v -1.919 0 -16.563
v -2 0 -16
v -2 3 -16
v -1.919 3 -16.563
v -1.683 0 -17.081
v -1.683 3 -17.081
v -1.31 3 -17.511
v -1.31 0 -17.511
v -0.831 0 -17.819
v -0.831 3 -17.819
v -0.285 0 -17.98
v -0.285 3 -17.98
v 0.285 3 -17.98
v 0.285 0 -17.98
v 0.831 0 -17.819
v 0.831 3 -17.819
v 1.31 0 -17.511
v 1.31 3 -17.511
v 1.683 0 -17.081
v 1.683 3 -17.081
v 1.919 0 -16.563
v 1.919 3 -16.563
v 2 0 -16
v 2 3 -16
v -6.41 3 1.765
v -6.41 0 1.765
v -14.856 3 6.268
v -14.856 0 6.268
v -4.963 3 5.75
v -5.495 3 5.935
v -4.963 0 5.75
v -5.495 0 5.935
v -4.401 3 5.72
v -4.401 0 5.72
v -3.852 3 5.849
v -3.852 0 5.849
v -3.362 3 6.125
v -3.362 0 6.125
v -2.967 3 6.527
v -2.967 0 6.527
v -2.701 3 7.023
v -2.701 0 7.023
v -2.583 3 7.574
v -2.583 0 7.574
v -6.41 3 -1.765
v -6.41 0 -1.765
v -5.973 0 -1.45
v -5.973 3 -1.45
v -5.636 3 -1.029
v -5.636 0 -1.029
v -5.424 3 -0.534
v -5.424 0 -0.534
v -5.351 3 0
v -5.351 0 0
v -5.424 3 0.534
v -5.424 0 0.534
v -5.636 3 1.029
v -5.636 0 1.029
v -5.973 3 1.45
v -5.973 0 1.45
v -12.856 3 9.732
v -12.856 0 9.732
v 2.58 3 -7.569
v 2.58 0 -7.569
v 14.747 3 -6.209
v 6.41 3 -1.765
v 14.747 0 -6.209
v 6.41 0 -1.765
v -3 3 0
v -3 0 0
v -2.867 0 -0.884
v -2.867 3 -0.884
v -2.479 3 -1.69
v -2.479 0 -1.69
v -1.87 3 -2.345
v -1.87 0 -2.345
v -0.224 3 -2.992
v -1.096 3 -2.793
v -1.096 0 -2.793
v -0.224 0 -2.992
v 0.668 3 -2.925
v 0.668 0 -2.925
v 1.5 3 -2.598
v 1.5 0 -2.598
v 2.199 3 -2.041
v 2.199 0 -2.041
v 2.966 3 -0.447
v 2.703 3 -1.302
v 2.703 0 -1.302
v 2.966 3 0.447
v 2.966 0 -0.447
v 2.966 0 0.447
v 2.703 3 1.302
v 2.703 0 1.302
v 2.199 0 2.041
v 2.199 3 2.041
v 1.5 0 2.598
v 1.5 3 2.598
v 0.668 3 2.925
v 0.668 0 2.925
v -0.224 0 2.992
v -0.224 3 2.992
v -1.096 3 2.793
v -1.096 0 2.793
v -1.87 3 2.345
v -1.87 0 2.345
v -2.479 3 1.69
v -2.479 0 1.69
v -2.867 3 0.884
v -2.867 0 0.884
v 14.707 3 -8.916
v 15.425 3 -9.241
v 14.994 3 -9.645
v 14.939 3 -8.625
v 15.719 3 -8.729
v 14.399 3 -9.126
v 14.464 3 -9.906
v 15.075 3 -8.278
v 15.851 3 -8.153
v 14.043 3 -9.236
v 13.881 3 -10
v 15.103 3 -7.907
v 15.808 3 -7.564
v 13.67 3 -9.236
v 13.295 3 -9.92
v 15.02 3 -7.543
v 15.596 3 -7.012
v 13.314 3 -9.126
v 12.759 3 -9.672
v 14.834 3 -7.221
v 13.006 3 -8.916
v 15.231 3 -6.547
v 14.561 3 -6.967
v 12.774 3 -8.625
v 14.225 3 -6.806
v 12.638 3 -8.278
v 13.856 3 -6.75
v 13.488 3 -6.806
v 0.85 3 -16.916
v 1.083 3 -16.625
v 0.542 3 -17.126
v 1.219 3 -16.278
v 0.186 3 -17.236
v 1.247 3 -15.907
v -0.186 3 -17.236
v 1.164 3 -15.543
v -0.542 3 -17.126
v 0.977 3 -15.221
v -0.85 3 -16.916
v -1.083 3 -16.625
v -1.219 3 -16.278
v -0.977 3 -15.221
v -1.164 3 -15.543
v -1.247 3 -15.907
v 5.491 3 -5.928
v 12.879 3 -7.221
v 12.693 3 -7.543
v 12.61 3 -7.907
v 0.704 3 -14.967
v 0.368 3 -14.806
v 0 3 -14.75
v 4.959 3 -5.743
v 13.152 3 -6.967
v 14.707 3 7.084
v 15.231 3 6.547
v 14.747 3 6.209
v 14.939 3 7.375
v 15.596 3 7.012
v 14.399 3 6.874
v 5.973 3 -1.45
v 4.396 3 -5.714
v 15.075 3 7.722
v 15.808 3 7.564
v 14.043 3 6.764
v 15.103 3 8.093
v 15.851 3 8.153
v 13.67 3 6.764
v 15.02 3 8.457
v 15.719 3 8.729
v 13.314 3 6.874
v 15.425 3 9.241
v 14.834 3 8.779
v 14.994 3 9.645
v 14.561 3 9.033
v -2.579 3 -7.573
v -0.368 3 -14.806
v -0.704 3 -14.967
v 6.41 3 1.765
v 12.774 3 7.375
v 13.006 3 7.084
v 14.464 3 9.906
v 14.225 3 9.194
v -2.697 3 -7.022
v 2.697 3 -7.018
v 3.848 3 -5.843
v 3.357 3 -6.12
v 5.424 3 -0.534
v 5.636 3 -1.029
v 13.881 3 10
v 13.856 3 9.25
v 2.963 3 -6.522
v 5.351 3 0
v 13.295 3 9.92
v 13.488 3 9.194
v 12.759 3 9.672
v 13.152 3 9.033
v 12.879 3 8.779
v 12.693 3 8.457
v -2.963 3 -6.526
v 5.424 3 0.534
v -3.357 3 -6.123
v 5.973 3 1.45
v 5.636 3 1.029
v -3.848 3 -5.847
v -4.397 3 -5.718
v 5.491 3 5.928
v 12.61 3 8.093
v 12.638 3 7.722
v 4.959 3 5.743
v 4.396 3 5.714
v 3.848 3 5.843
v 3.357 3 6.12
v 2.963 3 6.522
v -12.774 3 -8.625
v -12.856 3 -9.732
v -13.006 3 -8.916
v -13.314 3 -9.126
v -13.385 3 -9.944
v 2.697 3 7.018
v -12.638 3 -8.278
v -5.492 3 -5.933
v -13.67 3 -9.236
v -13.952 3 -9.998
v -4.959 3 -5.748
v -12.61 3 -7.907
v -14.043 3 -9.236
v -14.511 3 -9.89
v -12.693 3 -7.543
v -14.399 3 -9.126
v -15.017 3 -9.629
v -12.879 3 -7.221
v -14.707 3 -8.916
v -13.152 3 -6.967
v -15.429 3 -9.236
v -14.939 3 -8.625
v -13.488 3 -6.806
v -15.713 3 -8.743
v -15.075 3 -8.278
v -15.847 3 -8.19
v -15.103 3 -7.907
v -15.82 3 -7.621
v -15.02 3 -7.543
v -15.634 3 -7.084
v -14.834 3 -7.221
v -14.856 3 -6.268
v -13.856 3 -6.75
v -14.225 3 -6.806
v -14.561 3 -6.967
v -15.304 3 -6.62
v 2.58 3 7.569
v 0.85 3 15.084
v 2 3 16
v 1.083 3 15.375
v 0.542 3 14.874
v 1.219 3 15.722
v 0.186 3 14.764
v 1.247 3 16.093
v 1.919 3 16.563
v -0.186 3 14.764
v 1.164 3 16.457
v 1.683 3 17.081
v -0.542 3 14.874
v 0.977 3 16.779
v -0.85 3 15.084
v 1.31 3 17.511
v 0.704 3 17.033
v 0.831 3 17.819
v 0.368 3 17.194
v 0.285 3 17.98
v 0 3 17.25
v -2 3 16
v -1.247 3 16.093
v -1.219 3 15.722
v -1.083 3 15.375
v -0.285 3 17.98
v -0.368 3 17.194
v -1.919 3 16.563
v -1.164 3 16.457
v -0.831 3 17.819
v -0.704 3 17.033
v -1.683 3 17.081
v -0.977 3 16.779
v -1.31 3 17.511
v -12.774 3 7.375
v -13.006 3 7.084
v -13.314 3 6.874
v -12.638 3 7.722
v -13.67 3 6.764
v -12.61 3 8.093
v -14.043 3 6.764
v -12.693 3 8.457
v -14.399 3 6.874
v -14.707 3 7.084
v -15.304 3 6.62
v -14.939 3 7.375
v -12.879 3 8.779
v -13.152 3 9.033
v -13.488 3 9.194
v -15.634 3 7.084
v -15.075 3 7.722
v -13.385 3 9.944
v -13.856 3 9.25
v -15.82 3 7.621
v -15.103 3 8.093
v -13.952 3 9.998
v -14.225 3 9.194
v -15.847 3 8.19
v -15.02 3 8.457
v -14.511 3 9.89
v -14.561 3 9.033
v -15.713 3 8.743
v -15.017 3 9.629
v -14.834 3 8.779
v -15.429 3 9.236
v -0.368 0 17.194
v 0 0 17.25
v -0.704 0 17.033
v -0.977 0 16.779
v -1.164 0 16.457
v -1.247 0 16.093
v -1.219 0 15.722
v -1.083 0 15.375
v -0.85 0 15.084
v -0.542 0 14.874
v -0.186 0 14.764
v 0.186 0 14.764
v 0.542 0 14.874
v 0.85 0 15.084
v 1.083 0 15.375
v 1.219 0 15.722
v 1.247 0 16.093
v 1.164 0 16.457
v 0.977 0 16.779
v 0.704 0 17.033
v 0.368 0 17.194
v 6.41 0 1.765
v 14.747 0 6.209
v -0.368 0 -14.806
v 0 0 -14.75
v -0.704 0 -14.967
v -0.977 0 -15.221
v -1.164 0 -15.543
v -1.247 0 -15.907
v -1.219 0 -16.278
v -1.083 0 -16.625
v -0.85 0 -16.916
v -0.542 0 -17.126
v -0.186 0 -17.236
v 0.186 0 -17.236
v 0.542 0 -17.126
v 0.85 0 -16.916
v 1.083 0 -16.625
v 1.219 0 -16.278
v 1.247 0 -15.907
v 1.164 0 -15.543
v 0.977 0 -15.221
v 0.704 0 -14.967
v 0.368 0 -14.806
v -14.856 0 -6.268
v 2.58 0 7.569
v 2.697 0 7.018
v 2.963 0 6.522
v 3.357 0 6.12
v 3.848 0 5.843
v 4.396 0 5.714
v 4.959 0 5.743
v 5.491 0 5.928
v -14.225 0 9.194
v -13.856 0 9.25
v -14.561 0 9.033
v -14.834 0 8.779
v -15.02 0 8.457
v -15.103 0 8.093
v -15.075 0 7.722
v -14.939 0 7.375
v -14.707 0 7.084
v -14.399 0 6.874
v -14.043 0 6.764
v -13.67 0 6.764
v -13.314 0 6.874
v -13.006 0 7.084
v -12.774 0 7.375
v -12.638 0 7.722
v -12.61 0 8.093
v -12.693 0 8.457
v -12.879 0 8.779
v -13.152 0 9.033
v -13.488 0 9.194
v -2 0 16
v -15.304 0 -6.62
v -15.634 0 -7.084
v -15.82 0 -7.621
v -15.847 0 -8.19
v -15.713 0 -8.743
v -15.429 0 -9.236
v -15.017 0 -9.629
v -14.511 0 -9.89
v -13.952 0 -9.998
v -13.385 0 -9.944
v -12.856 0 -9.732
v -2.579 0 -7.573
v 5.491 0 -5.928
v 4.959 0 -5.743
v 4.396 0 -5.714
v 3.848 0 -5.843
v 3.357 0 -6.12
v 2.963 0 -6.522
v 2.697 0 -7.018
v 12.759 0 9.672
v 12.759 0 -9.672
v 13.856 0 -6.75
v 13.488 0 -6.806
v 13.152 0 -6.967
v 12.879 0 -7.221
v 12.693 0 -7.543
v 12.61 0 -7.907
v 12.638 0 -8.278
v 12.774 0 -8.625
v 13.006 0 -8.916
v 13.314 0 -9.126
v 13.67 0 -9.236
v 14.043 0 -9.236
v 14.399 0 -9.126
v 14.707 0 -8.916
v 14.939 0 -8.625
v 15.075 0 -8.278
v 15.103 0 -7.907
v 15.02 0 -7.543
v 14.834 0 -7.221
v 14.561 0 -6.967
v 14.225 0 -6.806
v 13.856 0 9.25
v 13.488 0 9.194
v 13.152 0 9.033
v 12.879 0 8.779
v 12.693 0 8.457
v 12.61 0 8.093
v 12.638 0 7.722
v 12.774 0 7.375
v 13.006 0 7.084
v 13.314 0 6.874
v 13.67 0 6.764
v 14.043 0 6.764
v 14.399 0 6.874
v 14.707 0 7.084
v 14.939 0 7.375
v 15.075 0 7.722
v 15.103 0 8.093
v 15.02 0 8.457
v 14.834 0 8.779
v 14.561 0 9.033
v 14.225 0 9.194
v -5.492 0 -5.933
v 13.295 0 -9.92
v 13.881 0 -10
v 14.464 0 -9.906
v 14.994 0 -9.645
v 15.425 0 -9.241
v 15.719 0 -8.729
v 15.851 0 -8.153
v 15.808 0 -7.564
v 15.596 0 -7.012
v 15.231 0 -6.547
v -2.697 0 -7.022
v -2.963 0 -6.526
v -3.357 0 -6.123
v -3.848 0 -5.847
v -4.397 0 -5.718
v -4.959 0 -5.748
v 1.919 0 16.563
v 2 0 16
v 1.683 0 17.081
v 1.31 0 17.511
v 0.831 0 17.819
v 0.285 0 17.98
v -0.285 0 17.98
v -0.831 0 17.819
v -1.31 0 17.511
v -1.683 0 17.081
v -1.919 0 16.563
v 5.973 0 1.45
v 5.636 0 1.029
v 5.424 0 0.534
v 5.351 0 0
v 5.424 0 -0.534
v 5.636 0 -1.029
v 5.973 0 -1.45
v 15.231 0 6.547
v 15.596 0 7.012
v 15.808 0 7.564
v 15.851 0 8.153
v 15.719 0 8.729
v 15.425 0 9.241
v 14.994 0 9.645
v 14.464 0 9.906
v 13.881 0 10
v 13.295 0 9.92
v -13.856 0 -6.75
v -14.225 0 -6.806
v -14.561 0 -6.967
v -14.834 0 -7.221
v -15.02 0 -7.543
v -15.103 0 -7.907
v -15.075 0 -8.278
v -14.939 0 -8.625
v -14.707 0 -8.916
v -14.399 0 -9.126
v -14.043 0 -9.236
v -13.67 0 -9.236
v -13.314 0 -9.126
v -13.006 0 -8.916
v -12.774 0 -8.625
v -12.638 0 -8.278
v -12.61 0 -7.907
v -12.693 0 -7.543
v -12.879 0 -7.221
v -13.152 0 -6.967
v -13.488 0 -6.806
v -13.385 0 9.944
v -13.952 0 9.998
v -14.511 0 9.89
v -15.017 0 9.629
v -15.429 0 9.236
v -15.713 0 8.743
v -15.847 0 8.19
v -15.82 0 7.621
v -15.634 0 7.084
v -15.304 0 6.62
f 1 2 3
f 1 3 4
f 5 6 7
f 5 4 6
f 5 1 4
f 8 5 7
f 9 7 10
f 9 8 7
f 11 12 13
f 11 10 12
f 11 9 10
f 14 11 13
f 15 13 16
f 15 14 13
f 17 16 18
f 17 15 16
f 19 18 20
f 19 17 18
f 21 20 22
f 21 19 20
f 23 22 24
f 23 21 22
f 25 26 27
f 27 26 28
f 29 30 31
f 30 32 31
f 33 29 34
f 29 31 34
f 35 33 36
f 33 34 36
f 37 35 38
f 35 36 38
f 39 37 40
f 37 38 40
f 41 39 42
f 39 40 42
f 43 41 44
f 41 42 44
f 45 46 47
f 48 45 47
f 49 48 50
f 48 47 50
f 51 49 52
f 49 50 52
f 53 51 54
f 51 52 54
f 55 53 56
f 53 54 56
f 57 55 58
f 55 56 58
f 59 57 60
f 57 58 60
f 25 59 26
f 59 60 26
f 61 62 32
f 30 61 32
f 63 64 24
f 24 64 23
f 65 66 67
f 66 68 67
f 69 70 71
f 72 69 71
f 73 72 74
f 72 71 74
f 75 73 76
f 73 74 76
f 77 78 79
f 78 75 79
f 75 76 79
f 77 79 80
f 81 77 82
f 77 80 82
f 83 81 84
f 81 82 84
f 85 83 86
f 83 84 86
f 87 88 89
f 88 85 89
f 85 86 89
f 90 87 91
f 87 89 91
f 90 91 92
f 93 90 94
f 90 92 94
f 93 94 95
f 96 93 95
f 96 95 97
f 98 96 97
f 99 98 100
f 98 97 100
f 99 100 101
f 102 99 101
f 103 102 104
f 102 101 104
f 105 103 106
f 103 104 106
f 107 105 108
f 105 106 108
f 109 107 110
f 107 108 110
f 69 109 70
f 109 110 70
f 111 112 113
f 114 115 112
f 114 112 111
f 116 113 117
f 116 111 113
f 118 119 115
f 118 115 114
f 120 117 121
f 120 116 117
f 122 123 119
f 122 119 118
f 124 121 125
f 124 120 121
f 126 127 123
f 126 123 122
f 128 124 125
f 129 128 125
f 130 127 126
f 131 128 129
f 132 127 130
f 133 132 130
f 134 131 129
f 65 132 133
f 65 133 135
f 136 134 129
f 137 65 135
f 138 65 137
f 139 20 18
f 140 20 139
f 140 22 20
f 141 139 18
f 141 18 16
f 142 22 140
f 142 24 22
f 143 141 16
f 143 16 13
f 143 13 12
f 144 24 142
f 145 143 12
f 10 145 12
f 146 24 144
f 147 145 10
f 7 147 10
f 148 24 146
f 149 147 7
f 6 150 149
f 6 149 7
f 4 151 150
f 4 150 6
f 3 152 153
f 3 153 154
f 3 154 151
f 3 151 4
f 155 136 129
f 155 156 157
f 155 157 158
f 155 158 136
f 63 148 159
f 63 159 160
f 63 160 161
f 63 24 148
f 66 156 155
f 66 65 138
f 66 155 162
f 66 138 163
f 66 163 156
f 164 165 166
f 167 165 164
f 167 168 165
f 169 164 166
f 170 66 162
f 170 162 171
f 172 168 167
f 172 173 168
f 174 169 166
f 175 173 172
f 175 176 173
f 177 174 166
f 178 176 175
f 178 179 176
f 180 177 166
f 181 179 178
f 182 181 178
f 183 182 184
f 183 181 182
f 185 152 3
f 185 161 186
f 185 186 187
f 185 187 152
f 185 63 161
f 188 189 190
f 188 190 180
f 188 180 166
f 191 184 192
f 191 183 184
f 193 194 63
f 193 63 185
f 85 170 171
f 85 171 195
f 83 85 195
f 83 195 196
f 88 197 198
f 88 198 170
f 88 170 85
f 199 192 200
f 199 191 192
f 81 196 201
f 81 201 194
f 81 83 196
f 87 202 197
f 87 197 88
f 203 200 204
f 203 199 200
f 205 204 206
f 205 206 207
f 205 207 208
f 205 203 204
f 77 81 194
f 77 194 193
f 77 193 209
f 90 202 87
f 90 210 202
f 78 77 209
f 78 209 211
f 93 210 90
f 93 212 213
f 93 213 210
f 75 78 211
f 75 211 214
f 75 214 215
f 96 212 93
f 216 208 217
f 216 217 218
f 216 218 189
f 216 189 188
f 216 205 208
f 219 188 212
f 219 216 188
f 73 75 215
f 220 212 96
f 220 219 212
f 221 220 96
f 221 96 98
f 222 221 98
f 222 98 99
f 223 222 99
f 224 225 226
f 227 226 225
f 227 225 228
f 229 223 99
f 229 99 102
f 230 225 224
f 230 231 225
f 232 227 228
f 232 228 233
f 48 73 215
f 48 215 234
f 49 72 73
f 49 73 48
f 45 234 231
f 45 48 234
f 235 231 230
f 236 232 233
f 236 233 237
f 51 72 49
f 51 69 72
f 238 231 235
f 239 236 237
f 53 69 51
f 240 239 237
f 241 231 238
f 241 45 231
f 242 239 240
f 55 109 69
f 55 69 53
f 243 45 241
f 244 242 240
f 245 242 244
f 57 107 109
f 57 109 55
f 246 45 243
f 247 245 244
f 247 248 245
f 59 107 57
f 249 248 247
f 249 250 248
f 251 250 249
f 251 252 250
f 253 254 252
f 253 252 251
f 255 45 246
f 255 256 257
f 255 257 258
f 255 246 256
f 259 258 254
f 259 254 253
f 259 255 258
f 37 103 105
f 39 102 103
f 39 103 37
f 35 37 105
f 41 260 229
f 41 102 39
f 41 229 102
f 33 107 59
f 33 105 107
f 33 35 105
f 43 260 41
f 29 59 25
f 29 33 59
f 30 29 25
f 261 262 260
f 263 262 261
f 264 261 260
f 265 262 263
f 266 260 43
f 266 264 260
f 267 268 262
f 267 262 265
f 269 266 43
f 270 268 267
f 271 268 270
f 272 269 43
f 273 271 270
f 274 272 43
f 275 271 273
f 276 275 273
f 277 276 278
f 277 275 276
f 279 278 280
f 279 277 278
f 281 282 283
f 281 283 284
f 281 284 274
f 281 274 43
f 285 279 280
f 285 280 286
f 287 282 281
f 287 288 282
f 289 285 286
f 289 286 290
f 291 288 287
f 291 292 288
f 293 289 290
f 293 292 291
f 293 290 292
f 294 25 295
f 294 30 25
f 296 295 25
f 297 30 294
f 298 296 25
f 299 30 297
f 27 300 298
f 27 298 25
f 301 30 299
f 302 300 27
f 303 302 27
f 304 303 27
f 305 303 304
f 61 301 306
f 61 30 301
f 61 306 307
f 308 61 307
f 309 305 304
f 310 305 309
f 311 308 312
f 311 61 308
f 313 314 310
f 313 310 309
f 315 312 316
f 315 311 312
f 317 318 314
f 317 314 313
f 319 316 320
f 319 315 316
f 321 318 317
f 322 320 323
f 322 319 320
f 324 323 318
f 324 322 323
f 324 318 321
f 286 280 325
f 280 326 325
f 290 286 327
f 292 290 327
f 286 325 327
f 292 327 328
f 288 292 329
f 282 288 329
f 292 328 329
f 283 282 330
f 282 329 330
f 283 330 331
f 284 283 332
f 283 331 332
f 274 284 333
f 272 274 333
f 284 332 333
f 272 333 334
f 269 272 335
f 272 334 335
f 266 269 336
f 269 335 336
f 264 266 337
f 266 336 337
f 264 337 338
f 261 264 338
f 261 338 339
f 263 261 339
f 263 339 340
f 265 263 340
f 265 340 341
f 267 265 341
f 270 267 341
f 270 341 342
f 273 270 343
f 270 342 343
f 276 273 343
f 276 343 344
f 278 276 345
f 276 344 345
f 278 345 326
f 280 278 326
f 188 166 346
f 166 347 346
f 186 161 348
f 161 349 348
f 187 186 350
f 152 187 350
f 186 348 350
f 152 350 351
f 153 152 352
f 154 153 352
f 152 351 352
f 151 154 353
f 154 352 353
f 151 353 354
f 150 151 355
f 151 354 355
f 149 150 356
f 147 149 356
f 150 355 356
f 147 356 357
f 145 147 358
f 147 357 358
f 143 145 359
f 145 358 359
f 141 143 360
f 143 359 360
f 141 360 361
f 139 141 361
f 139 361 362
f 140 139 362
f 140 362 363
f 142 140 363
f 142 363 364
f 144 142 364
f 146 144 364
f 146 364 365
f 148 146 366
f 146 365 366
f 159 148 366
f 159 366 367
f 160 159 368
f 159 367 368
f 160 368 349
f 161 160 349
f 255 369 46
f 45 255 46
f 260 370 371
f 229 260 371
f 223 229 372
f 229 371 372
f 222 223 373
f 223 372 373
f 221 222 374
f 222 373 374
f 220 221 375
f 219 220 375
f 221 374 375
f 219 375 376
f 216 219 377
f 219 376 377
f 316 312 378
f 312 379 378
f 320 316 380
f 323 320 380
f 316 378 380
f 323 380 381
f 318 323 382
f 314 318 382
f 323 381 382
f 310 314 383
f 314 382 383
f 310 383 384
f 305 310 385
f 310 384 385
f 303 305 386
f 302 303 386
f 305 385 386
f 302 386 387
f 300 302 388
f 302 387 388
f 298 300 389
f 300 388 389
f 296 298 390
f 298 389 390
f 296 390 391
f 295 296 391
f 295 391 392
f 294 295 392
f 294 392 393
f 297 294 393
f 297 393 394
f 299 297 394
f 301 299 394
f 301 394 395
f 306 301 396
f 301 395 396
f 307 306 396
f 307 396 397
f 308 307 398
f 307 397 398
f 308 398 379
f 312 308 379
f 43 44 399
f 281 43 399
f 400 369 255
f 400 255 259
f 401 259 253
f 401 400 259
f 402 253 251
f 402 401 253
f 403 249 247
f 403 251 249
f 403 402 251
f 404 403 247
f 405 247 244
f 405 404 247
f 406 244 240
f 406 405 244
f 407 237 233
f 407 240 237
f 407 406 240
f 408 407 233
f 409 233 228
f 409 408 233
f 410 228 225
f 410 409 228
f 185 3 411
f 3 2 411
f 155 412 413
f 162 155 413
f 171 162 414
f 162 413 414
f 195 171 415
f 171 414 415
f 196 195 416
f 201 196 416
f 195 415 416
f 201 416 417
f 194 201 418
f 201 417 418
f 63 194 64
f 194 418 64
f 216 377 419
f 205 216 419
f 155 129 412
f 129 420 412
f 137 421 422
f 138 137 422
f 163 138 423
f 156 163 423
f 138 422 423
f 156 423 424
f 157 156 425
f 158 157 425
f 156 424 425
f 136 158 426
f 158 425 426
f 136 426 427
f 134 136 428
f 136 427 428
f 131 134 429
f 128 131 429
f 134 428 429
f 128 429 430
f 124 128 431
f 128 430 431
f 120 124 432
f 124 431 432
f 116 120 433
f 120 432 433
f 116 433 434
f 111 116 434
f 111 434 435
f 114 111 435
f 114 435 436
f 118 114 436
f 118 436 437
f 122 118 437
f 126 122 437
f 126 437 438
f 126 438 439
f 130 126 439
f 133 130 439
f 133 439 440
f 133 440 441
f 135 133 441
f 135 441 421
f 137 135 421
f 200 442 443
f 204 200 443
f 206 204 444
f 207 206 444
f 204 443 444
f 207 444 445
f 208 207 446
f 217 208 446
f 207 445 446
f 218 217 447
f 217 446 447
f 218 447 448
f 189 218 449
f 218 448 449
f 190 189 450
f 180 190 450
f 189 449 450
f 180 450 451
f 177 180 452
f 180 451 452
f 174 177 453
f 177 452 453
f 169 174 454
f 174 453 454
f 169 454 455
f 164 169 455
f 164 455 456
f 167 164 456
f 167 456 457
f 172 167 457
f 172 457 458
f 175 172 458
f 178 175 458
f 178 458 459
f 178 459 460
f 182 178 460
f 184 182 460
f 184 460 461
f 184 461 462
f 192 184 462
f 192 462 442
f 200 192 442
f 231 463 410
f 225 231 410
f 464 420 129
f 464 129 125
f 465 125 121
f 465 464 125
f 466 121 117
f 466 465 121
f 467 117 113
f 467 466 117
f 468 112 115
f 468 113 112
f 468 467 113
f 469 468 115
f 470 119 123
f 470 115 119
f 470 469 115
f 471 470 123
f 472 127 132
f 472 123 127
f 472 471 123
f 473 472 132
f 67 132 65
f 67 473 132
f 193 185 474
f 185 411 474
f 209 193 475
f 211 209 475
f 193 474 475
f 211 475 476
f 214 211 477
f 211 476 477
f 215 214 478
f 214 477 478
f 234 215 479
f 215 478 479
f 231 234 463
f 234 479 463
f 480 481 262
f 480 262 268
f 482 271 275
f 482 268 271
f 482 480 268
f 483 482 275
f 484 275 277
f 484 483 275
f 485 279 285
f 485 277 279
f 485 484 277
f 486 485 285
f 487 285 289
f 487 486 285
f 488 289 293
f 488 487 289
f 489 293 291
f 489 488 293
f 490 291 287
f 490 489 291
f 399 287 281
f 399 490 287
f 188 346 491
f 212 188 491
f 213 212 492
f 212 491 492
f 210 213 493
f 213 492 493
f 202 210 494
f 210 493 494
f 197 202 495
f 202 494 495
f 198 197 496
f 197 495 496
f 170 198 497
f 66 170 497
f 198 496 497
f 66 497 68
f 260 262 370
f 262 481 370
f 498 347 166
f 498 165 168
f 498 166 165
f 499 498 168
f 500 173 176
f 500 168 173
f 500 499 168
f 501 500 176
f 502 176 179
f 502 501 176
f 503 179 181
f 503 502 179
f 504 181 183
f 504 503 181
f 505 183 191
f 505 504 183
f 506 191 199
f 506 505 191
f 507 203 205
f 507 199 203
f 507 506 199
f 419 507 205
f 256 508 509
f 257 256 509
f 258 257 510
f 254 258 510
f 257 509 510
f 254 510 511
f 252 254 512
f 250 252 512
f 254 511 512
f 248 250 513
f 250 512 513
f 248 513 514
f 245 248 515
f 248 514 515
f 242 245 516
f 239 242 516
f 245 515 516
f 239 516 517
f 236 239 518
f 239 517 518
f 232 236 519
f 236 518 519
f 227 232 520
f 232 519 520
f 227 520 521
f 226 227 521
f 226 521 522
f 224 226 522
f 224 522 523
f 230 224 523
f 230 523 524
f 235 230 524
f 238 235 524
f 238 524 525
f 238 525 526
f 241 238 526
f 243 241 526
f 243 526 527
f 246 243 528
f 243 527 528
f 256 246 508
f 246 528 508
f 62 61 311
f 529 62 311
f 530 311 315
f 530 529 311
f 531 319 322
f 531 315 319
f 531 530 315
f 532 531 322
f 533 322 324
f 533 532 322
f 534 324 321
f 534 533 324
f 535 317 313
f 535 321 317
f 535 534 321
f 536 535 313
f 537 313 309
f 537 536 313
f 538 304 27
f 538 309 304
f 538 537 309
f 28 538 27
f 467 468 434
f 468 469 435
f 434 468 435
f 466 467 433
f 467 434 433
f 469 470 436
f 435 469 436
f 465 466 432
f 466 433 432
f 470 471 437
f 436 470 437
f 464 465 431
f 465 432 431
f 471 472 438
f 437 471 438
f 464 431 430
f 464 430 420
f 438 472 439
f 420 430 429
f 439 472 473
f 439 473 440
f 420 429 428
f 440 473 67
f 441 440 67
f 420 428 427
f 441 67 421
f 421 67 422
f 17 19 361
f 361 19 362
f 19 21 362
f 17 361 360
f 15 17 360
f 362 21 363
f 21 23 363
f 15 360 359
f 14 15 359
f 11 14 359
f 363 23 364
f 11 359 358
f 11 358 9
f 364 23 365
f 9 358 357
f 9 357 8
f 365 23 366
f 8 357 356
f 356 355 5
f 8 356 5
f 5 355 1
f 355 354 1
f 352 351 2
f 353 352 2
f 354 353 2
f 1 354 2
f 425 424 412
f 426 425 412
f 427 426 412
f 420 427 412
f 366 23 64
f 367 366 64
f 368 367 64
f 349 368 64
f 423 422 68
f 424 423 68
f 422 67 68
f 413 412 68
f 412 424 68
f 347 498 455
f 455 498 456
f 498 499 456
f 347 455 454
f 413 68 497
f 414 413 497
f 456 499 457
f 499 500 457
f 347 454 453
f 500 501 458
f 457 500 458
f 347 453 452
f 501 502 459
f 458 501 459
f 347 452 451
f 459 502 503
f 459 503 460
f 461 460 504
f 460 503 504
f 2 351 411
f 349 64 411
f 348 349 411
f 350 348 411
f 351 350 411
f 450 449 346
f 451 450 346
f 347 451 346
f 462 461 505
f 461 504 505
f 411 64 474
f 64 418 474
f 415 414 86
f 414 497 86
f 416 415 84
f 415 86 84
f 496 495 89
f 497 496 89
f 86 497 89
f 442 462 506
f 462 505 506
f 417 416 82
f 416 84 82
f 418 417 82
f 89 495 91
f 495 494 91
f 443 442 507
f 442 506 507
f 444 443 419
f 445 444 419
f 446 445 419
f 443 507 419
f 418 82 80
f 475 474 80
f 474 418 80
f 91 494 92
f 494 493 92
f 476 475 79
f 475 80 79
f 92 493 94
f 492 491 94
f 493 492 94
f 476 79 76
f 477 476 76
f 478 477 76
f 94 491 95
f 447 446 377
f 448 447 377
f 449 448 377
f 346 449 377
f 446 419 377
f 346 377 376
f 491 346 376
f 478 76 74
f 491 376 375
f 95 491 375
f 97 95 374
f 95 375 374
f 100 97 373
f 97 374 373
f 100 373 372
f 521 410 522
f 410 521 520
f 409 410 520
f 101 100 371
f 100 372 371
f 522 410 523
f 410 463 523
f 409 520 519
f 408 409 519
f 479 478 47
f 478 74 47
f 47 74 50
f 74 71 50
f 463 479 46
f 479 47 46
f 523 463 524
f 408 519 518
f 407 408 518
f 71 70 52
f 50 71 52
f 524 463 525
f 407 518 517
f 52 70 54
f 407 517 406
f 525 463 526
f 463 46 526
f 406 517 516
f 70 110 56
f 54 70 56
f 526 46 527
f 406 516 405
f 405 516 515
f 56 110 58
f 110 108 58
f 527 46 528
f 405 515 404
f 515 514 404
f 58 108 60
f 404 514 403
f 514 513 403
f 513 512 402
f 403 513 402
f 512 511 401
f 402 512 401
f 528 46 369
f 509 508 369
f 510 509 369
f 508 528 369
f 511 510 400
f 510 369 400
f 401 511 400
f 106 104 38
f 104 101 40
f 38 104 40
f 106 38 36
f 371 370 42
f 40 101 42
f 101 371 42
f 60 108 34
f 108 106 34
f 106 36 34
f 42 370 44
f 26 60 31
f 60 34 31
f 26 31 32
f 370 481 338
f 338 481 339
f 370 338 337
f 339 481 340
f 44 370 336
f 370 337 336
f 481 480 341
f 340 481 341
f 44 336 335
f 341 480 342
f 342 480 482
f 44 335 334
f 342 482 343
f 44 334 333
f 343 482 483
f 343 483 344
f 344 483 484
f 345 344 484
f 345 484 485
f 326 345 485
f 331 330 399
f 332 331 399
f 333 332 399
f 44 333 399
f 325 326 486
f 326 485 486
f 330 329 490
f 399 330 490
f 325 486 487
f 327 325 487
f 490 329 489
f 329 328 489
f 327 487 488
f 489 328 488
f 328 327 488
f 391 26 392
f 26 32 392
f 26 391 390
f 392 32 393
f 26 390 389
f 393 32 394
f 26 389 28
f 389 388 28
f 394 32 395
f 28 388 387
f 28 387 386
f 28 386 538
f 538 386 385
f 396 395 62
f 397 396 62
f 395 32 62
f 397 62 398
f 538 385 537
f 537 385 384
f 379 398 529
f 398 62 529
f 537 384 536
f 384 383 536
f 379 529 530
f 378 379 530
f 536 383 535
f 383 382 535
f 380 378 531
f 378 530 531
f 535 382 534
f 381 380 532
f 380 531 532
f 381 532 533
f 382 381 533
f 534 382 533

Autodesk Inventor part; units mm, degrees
ref_plane "YZ Plane" through (0, 0, 0) normal (1, 0, 0) x (0, 1, 0)
ref_plane "XZ Plane" through (0, 0, 0) normal (0, 1, 0) x (-1, 0, 0)
ref_plane "XY Plane" through (0, 0, 0) normal (0, 0, 1) x (1, 0, 0)
sketch "Boceto1" plane through (0, 0, 0) normal (0, 1, 0) x (-1, 0, 0)
  circle A0 centre (0, -16) radius 2
  circle A1 centre (13.856406, -8) radius 2
  circle A2 centre (13.856406, 8) radius 2
  circle A3 centre (0, 16) radius 2
  circle A4 centre (-13.856406, 8) radius 2
  circle A5 centre (-13.856406, -8) radius 2
  line L0 (-12.759095, -9.672097) -> (-5.490746, -5.928235)
  line L1 (-6.410449, -1.764863) -> (-14.746933, -6.209201)
  line L2 (-6.410449, 1.764863) -> (-14.746933, 6.209201)
  line L3 (-12.759095, 9.672097) -> (-5.490746, 5.928235)
  line L4 (2, 16) -> (2.583184, 7.574131)
  line L5 (-2, 16) -> (-2.579628, 7.569051)
  line L6 (2.579349, -7.573106) -> (2, -16)
  line L7 (-2.579628, -7.569051) -> (-2, -16)
  line L8 (12.856406, 9.732051) -> (5.495313, 5.934789)
  line L9 (14.856406, 6.267949) -> (6.4102, 1.764839)
  line L10 (14.856406, -6.267949) -> (6.4102, -1.764839)
  line L11 (12.856406, -9.732051) -> (5.491541, -5.932843)
  circle A6 centre (0, 0) radius 3
  arc A7 (-6.410449, -1.764863) -> (-6.410449, 1.764863) centre (-7.351331, 0) ccw
  arc A8 (-2.579628, -7.569051) -> (-5.490746, -5.928235) centre (-4.574918, -7.706228) ccw
  arc A9 (5.491541, -5.932843) -> (2.579349, -7.573106) centre (4.574639, -7.710282) ccw
  arc A10 (6.4102, 1.764839) -> (6.4102, -1.764839) centre (7.351127, 0) ccw
  arc A11 (2.583184, 7.574131) -> (5.495313, 5.934789) centre (4.578411, 7.712228) ccw
  arc A12 (-5.490746, 5.928235) -> (-2.579628, 7.569051) centre (-4.574918, 7.706228) ccw
  point P0 (0, -3.1)
  point P1 (-3.1, 0)
  point P2 (0, 3.1)
  point P3 (3.1, 0)
  dimension "d17" = 360
  dimension "d19" = 6
  dimension "d20" = 2
sketch "Boceto1 outline for Extrusión1" plane through (0, 0, 0) normal (0, 1, 0) x (-1, 0, 0)
  arc A0 (5.495313, 5.934789) -> (2.583184, 7.574131) centre (4.578411, 7.712228) cw
  line L0 (12.856406, 9.732051) -> (5.495313, 5.934789)
  line L1 (2.583184, 7.574131) -> (2, 16)
  arc A1 (14.856406, 6.267949) -> (12.856406, 9.732051) centre (13.856406, 8) ccw
  arc A2 (2, 16) -> (-2, 16) centre (0, 16) ccw
  line L2 (6.4102, 1.764839) -> (14.856406, 6.267949)
  line L3 (-2, 16) -> (-2.579628, 7.569051)
  arc A3 (6.4102, -1.764839) -> (6.4102, 1.764839) centre (7.351127, 0) cw
  arc A4 (-2.579628, 7.569051) -> (-5.490746, 5.928235) centre (-4.574918, 7.706228) cw
  line L4 (14.856406, -6.267949) -> (6.4102, -1.764839)
  line L5 (-5.490746, 5.928235) -> (-12.759095, 9.672097)
  arc A5 (12.856406, -9.732051) -> (14.856406, -6.267949) centre (13.856406, -8) ccw
  arc A6 (-12.759095, 9.672097) -> (-14.746933, 6.209201) centre (-13.856406, 8) ccw
  line L6 (5.491541, -5.932843) -> (12.856406, -9.732051)
  line L7 (-14.746933, 6.209201) -> (-6.410449, 1.764863)
  arc A7 (2.579349, -7.573106) -> (5.491541, -5.932843) centre (4.574639, -7.710282) cw
  arc A8 (-6.410449, 1.764863) -> (-6.410449, -1.764863) centre (-7.351331, 0) cw
  line L8 (2, -16) -> (2.579349, -7.573106)
  line L9 (-6.410449, -1.764863) -> (-14.746933, -6.209201)
  arc A9 (-2, -16) -> (2, -16) centre (0, -16) ccw
  arc A10 (-14.746933, -6.209201) -> (-12.759095, -9.672097) centre (-13.856406, -8) ccw
  line L10 (-2.579628, -7.569051) -> (-2, -16)
  line L11 (-12.759095, -9.672097) -> (-5.490746, -5.928235)
  arc A11 (-5.490746, -5.928235) -> (-2.579628, -7.569051) centre (-4.574918, -7.706228) cw
  circle A12 centre (0, 0) radius 3
extrude "Extrusión1" add sketch "Boceto1 outline for Extrusión1" along normal blind 3
sketch "Boceto2" plane through (0, 3, 0) normal (0, 1, 0) x (1, 0, 0)
  arc A0 (-14.856406, -6.267949) -> (-12.856406, -9.732051) centre (-13.856406, -8) ccw
  circle A1 centre (-13.856406, -8) radius 1.25
  arc A2 (-2, -16) -> (2, -16) centre (0, -16) ccw
  circle A3 centre (0, -16) radius 1.25
  arc A4 (-12.856406, 9.732051) -> (-14.856406, 6.267949) centre (-13.856406, 8) ccw
  circle A5 centre (-13.856406, 8) radius 1.25
  arc A6 (2, 16) -> (-2, 16) centre (0, 16) ccw
  circle A7 centre (0, 16) radius 1.25
  arc A8 (14.746933, 6.209201) -> (12.759095, 9.672097) centre (13.856406, 8) ccw
  circle A9 centre (13.856406, 8) radius 1.25
  arc A10 (12.759095, -9.672097) -> (14.746933, -6.209201) centre (13.856406, -8) ccw
  circle A11 centre (13.856406, -8) radius 1.25
  point P0 (0, 0)
  dimension "d23" = 2.5
  dimension "d24" = 2.5
  dimension "d25" = 2.5
  dimension "d26" = 2.5
  dimension "d27" = 2.5
  dimension "d28" = 2.5
hole "Agujero1" at (0, 3, -16) at (-13.856406, 3, -8) at (0, 3, 16) at (13.856406, 3, 8) at (13.856406, 3, -8) direction (0, -1, 0) diameter 2.5 end through all
sketch "Boceto3" plane through (0, 3, 0) normal (0, 1, 0) x (1, 0, 0)
  arc A0 (-14.856406, -6.267949) -> (-12.856406, -9.732051) centre (-13.856406, -8) ccw
  circle A1 centre (-13.856406, -8) radius 1.25
  point P0 (0, 0)
  dimension "d36" = 2.5
hole "Agujero2" at (-13.856406, 3, 8) direction (0, -1, 0) diameter 2.5 end through all
sketch "Boceto4" plane through (0, 3, 0) normal (0, 1, 0) x (1, 0, 0)
  point P0 (0, 0)
properties part number "Extension"
